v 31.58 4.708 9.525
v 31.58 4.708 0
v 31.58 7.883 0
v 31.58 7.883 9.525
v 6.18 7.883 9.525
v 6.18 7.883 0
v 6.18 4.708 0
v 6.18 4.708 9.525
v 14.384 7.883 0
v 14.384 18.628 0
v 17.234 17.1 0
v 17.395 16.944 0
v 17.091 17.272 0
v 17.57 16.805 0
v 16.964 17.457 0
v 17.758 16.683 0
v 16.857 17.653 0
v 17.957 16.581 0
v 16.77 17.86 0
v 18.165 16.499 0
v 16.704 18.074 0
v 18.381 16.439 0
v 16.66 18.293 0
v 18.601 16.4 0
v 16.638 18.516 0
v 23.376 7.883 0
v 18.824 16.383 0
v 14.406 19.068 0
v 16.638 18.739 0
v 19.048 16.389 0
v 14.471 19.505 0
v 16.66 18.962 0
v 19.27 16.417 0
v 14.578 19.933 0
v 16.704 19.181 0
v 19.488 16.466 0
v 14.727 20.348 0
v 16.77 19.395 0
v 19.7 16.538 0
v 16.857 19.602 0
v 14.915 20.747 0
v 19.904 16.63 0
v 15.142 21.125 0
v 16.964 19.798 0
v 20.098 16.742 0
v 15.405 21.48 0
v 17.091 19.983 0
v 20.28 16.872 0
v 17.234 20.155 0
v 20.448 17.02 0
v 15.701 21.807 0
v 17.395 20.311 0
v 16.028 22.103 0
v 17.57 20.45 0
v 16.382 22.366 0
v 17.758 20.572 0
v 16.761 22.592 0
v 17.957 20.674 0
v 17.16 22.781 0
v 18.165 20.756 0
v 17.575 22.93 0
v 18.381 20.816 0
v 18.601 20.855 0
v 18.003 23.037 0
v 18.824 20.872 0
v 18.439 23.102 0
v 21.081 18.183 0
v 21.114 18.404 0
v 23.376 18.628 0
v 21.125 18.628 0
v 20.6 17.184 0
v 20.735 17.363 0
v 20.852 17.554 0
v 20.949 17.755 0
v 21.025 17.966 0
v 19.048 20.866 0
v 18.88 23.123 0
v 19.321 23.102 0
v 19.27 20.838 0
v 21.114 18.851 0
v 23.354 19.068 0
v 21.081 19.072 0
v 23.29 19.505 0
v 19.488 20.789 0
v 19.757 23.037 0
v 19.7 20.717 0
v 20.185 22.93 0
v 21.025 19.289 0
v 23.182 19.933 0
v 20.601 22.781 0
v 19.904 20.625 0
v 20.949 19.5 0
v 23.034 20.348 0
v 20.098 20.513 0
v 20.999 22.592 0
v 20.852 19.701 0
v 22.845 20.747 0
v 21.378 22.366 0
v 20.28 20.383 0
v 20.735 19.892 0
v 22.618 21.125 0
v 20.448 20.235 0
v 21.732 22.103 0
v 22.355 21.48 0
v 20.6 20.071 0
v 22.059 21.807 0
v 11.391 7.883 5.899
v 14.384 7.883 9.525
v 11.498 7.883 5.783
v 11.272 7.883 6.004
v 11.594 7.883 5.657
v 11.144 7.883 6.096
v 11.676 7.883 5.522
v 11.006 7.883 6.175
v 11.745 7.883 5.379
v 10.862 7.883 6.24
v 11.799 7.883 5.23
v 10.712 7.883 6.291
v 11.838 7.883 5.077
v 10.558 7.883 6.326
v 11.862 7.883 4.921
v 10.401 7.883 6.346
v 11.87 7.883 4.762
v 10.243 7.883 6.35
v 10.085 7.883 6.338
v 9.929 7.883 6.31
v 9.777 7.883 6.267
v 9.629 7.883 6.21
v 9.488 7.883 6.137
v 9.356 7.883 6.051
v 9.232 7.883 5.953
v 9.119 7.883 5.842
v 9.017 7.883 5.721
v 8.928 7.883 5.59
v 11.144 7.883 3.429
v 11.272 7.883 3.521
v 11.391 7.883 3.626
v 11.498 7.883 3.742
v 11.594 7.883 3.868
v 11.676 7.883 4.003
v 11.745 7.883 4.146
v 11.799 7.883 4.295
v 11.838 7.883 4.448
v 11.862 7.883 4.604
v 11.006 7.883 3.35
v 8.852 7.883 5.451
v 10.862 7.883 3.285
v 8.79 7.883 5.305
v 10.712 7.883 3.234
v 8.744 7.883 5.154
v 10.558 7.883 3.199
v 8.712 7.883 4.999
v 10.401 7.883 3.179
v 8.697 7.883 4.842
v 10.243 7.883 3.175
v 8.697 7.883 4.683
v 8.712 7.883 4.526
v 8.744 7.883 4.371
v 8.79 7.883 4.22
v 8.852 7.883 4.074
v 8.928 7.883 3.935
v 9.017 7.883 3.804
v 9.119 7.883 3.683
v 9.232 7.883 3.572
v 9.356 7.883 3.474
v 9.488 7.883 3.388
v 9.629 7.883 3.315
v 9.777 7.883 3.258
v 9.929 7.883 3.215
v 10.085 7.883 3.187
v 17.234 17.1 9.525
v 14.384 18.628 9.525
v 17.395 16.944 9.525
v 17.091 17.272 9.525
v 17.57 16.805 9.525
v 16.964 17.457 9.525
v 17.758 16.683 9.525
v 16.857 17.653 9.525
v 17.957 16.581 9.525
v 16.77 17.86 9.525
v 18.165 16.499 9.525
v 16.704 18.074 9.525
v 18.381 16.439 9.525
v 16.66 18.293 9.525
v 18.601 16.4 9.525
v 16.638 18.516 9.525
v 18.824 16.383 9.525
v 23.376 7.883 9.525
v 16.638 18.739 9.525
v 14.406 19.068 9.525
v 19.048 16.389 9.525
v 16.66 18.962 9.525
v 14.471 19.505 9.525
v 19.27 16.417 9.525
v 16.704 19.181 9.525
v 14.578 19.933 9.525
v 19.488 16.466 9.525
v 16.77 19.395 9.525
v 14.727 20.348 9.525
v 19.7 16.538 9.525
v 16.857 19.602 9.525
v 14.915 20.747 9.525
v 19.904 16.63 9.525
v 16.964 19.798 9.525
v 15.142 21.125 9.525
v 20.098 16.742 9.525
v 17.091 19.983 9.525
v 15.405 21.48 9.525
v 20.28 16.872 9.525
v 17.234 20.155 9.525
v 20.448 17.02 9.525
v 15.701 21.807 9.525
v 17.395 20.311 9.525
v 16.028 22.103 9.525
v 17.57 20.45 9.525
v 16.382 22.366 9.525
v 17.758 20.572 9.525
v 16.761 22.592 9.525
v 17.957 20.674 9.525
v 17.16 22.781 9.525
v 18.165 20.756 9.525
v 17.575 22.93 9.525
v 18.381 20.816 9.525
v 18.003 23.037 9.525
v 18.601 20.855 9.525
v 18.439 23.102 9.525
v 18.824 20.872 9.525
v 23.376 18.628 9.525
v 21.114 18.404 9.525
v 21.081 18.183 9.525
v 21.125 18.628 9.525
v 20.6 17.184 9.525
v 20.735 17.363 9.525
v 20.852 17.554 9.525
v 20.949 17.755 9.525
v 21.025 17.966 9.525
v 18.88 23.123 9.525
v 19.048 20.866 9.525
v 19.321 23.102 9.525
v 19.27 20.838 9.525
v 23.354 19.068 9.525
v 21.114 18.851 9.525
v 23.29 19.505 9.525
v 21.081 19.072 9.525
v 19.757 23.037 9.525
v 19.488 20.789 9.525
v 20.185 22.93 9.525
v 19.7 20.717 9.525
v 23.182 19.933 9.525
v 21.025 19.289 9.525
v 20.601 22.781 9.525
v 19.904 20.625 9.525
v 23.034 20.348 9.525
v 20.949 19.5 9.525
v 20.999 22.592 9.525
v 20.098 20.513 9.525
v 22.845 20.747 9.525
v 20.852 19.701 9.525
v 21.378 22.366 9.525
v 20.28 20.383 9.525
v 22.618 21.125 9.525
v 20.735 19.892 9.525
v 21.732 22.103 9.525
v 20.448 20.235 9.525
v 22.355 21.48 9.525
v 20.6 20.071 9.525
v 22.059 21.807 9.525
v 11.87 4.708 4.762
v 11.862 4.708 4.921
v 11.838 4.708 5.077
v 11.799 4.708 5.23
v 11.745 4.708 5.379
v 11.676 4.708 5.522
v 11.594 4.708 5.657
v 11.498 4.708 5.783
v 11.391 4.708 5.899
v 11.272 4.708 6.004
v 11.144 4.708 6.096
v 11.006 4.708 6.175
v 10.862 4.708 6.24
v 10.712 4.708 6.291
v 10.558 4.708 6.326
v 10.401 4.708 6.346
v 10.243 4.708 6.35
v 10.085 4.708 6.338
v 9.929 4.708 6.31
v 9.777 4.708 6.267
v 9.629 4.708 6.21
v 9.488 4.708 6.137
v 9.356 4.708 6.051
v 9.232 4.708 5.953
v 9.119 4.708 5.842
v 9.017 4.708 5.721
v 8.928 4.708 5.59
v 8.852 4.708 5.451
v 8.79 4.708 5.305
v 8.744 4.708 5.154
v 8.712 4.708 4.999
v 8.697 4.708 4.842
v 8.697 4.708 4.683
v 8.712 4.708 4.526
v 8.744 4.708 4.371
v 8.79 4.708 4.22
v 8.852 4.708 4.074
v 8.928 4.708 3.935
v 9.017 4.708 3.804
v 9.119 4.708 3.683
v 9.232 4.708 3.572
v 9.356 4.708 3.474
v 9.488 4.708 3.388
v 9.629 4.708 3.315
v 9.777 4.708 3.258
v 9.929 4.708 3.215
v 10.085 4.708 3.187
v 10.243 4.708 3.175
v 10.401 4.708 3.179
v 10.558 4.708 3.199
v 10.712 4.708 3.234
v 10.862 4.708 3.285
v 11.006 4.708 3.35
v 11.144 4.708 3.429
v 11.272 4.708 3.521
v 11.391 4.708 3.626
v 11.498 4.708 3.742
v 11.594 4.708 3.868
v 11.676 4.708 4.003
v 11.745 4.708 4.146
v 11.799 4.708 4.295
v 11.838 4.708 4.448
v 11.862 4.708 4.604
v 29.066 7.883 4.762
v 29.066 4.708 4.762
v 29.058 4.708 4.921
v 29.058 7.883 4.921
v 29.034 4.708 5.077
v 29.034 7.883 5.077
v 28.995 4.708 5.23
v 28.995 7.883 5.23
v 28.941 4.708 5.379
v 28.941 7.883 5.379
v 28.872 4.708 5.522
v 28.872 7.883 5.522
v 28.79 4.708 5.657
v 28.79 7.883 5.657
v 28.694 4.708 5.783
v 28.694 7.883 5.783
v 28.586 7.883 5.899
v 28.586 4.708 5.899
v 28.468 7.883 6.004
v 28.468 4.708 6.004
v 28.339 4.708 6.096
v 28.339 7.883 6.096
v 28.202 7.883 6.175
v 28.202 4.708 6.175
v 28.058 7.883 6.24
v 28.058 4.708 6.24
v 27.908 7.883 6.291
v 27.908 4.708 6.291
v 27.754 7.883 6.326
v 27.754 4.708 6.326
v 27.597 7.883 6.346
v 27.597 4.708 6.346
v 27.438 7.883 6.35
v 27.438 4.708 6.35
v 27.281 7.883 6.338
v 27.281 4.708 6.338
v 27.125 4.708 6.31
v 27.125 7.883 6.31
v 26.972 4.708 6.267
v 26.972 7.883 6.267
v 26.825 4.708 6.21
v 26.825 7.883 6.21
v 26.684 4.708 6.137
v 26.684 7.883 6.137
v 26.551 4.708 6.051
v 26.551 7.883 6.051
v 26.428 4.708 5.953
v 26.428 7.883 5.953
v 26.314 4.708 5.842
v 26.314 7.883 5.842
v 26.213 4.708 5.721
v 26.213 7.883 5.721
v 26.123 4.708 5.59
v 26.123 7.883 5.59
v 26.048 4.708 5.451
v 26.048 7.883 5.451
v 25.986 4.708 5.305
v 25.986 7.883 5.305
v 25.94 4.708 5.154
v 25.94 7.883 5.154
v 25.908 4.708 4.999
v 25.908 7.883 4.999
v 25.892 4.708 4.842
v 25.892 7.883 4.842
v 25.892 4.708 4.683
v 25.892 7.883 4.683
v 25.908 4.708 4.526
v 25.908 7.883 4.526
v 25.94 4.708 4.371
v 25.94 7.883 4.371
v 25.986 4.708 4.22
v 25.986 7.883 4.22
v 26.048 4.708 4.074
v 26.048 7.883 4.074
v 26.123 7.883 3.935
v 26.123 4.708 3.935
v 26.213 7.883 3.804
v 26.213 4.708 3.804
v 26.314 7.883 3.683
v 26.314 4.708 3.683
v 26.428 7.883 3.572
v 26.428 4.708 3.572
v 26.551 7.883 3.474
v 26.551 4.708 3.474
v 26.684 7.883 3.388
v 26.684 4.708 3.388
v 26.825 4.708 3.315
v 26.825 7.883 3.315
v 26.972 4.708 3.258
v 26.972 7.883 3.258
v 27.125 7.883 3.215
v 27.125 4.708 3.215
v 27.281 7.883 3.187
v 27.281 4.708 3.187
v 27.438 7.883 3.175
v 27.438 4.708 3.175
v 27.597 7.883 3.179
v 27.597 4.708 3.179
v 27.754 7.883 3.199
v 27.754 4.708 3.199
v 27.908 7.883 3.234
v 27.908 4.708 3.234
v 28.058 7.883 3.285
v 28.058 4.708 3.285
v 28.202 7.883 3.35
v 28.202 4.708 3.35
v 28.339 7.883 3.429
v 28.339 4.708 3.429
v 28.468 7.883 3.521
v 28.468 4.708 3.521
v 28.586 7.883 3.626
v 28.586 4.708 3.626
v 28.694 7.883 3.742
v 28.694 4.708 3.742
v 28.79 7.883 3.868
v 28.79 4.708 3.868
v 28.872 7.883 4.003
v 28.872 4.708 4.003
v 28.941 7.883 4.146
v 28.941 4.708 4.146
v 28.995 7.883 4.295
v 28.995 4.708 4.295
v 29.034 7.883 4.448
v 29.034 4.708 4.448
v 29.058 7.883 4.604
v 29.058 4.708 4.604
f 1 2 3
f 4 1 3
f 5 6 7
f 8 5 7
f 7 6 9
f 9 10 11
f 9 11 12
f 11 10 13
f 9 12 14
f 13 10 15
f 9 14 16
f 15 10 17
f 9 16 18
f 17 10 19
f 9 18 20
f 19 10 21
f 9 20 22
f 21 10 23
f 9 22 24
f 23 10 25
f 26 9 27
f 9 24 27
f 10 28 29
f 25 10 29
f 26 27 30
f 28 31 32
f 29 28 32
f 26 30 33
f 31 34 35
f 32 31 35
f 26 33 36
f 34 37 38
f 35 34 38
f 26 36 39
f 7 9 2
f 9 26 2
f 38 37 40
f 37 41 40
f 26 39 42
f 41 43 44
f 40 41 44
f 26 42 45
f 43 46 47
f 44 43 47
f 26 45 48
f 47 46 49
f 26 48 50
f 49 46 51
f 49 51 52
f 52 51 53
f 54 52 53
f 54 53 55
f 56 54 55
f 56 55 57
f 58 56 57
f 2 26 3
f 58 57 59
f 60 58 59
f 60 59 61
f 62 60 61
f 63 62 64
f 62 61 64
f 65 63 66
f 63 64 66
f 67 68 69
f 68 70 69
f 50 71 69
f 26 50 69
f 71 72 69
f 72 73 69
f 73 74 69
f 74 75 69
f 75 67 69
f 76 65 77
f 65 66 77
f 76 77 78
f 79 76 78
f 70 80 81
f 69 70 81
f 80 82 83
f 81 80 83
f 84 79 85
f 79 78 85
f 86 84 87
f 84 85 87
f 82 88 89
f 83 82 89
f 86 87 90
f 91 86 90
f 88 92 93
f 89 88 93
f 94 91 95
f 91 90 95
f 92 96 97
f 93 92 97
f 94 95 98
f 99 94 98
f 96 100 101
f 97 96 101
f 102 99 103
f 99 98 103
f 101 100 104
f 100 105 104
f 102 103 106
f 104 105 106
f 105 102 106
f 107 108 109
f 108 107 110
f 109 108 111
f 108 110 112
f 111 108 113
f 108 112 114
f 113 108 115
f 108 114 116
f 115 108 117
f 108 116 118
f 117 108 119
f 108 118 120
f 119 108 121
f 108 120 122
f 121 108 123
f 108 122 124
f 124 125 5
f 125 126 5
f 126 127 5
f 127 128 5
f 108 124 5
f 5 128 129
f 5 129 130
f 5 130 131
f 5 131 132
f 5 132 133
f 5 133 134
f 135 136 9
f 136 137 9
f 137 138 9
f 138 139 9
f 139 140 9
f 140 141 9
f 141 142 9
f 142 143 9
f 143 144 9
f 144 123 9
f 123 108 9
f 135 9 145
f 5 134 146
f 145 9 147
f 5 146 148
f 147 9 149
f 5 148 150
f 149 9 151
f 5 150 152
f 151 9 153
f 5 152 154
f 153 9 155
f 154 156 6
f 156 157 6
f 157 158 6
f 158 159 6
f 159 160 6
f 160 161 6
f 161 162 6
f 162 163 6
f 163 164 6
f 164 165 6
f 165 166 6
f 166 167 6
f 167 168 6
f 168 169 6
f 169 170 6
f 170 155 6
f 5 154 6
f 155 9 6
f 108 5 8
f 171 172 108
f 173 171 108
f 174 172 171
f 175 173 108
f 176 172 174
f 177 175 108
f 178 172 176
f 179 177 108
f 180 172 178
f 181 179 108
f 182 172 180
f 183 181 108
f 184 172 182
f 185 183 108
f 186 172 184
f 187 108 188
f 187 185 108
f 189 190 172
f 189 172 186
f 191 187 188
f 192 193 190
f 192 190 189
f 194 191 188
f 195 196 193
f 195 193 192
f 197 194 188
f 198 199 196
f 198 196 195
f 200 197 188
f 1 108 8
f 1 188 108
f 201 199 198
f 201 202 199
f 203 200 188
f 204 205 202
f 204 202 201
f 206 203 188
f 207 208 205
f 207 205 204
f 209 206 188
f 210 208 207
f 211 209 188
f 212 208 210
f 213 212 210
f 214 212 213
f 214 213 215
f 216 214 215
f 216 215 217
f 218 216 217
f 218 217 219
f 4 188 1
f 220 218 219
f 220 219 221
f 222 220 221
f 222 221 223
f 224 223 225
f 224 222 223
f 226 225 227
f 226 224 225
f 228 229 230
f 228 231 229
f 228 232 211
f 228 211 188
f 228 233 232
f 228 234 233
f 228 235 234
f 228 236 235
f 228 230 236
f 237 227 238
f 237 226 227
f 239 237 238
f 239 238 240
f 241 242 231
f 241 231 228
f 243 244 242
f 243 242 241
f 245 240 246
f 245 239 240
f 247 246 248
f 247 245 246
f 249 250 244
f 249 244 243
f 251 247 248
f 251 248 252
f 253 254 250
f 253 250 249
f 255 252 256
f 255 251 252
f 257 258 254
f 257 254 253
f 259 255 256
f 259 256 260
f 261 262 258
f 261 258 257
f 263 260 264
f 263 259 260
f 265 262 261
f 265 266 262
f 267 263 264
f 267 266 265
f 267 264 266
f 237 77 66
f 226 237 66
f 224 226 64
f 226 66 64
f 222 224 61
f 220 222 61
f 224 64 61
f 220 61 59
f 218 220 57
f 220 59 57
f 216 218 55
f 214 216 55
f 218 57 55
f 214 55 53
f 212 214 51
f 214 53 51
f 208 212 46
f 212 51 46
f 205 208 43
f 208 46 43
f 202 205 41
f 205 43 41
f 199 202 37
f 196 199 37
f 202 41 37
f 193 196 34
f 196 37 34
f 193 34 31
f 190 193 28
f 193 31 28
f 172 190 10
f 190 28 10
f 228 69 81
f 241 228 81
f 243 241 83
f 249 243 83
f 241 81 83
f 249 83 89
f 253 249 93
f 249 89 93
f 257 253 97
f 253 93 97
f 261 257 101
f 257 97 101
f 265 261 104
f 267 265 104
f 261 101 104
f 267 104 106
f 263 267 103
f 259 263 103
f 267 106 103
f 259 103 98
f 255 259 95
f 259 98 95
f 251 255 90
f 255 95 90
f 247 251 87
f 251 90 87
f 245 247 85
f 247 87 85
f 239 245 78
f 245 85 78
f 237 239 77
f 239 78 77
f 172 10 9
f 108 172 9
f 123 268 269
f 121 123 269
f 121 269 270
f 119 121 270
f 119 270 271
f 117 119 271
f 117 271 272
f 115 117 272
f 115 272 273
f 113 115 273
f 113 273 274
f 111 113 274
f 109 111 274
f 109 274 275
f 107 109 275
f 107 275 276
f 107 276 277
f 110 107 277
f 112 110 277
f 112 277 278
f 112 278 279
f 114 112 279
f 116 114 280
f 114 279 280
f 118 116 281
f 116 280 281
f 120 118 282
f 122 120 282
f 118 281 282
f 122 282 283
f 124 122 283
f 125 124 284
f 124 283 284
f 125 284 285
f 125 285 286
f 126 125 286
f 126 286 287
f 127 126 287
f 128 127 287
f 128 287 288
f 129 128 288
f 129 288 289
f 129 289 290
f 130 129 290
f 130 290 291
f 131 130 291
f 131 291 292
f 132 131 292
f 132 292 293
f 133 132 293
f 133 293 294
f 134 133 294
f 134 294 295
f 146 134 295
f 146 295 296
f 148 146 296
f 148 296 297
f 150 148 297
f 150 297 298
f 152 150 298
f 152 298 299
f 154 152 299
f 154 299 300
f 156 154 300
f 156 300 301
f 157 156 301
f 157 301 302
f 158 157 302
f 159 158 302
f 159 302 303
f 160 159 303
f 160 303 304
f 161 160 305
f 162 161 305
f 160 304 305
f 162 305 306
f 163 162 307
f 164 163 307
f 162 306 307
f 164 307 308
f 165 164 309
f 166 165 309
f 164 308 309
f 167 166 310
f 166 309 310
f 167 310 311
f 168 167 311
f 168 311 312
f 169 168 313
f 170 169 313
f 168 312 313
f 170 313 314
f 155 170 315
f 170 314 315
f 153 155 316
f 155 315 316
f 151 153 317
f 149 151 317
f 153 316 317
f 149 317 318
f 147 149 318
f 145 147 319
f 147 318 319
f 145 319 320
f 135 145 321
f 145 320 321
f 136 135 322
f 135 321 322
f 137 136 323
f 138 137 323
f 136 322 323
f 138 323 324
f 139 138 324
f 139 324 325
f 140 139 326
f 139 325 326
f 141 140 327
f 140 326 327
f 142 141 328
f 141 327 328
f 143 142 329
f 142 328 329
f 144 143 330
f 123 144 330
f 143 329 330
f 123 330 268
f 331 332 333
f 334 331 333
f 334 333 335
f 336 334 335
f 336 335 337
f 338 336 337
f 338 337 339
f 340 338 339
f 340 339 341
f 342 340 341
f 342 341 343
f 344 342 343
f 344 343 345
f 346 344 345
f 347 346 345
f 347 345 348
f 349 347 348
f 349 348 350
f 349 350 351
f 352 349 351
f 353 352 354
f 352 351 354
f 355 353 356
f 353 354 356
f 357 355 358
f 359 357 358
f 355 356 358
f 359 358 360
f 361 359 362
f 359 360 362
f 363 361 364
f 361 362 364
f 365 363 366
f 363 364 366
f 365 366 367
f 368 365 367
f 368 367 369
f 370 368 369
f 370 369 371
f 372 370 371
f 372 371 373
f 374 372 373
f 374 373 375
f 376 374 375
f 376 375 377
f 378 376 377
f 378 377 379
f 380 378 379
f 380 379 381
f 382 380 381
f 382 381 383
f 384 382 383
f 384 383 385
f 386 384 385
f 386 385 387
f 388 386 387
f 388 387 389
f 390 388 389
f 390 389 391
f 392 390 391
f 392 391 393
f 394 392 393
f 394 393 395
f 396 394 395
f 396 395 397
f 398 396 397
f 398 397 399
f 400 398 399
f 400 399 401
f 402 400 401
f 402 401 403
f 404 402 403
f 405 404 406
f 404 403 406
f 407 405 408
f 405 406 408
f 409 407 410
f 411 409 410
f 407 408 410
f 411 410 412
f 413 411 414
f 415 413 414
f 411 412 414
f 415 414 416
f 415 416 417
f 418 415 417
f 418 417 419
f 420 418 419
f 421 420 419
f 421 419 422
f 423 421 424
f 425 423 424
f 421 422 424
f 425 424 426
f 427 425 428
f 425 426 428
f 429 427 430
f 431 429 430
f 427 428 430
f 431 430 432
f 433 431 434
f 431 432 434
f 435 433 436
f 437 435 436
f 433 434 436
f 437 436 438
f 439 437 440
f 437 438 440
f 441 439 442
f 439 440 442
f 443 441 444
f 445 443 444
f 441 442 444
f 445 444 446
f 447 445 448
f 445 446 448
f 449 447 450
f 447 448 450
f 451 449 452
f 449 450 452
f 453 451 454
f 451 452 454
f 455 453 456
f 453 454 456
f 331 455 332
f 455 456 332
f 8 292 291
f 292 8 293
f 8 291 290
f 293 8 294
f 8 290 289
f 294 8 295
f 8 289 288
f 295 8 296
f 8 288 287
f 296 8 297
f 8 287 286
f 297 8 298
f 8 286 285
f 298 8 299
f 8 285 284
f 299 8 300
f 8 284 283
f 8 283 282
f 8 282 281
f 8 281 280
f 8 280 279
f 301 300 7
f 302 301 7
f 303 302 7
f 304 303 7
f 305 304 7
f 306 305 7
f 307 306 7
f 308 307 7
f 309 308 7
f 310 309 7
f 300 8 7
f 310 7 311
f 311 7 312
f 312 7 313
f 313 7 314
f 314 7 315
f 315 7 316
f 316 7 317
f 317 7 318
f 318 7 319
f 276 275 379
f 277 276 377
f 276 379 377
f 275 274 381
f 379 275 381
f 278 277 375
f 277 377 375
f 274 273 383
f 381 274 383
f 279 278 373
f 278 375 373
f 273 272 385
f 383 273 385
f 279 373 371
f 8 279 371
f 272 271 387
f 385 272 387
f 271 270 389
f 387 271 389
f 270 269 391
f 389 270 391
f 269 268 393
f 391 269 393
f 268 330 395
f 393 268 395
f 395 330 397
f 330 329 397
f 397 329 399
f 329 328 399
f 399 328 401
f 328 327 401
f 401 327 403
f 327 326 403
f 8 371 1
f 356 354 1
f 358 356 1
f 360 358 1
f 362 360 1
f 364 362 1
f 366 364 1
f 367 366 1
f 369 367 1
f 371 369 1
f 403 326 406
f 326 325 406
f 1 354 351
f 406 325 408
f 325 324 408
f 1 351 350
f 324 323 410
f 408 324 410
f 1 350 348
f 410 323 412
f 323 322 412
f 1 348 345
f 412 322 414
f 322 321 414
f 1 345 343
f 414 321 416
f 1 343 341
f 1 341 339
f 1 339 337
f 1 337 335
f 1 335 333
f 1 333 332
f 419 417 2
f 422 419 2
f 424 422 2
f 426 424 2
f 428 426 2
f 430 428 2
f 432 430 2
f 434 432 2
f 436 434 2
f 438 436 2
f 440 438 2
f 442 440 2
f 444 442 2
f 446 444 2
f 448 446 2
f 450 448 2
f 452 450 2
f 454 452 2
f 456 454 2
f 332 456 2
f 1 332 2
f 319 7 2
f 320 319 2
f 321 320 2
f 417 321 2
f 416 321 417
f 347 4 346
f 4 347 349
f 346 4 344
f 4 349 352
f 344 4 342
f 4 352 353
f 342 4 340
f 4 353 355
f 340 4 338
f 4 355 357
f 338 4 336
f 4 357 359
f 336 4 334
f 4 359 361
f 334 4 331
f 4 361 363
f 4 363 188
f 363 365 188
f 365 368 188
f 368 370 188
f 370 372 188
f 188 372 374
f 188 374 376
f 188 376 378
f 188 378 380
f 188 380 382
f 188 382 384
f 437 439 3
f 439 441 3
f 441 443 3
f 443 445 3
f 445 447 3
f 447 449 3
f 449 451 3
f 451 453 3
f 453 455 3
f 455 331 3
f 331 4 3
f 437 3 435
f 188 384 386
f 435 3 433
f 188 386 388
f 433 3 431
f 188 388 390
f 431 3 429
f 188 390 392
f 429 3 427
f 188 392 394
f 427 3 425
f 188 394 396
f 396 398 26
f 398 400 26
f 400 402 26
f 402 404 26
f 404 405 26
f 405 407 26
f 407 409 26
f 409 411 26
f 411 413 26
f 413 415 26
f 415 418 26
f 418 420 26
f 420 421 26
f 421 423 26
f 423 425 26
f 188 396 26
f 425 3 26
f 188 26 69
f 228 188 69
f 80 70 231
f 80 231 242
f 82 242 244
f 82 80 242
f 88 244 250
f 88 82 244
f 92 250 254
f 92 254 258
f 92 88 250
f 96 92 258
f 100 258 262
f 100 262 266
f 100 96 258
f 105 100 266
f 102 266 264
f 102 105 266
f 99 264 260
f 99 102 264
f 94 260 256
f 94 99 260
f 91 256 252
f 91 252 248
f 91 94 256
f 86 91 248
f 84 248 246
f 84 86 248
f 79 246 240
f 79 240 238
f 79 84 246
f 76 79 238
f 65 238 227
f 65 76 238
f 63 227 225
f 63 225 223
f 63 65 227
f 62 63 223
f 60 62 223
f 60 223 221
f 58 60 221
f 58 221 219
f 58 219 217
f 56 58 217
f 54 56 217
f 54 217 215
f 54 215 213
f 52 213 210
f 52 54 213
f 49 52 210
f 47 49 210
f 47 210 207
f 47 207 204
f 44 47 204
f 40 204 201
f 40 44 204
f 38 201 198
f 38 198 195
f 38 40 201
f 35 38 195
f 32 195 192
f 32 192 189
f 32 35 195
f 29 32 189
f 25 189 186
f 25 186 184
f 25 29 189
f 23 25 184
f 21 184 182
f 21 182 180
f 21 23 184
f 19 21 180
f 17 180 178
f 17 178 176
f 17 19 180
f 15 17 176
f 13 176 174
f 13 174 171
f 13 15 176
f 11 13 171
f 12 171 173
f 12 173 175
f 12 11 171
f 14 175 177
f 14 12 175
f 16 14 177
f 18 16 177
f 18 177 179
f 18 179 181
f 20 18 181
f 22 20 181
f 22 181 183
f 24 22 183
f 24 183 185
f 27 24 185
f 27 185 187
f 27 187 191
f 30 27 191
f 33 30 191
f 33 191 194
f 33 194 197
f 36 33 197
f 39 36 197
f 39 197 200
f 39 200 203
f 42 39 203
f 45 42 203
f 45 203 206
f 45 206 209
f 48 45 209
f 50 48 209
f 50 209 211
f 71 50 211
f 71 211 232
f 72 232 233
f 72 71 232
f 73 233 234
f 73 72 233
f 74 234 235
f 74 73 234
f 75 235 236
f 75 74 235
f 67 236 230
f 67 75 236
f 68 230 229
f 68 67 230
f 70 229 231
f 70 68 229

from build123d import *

# Parameters (mm, degrees)
F0_R     = 2.2450679
F1_DEPTH = 9.525
F3_D     = 3.175
F5_D     = 3.175


# Not quite as in the source:
# - a length typed as a fraction of an inch, garbled in the dataset ("3 / 203.2 mm" for 3/8 in), is restored


with BuildPart() as f1:
    # F0 (on Top) → F1 (new body)
    with BuildSketch(Plane.XY):
        with BuildLine():
            Line((14.3843253767, 18.6275094501), (14.3843253767, 7.8833094501))
            Line((14.3843253767, 7.8833094501), (23.3759253767, 7.8833094501))
            Line((23.3759253767, 7.8833094501), (23.3759253767, 18.6275094501))
            ThreePointArc((23.3759253767, 18.6275094501), (22.0591360436, 21.806520117), (18.8801253767, 23.1233094501))
            ThreePointArc((18.8801253767, 23.1233094501), (15.7011147099, 21.806520117), (14.3843253767, 18.6275094501))
        make_face()
        with Locations((18.8801253767, 18.6275094501)):
            Circle(F0_R, mode=Mode.SUBTRACT)
        Polygon((6.1801253767, 7.8833094501), (6.1801253767, 4.7083094501), (31.5801253767, 4.7083094501), (31.5801253767, 7.8833094501), (23.3759253767, 7.8833094501), (14.3843253767, 7.8833094501), align=None)
    extrude(amount=F1_DEPTH)

    # F3 (through all)
    with Locations(Plane(origin=(0, 7.8833094501, 0), x_dir=(-1, 0, 0), z_dir=(0, 1, 0))):
        with Locations((-27.4780253767, 4.7625)):
            Hole(F3_D / 2)

    # F5 (through all)
    with Locations(Plane(origin=(0, 7.8833094501, 0), x_dir=(-1, 0, 0), z_dir=(0, 1, 0))):
        with Locations((-10.2822253767, 4.7625)):
            Hole(F5_D / 2)


solid = f1.part
